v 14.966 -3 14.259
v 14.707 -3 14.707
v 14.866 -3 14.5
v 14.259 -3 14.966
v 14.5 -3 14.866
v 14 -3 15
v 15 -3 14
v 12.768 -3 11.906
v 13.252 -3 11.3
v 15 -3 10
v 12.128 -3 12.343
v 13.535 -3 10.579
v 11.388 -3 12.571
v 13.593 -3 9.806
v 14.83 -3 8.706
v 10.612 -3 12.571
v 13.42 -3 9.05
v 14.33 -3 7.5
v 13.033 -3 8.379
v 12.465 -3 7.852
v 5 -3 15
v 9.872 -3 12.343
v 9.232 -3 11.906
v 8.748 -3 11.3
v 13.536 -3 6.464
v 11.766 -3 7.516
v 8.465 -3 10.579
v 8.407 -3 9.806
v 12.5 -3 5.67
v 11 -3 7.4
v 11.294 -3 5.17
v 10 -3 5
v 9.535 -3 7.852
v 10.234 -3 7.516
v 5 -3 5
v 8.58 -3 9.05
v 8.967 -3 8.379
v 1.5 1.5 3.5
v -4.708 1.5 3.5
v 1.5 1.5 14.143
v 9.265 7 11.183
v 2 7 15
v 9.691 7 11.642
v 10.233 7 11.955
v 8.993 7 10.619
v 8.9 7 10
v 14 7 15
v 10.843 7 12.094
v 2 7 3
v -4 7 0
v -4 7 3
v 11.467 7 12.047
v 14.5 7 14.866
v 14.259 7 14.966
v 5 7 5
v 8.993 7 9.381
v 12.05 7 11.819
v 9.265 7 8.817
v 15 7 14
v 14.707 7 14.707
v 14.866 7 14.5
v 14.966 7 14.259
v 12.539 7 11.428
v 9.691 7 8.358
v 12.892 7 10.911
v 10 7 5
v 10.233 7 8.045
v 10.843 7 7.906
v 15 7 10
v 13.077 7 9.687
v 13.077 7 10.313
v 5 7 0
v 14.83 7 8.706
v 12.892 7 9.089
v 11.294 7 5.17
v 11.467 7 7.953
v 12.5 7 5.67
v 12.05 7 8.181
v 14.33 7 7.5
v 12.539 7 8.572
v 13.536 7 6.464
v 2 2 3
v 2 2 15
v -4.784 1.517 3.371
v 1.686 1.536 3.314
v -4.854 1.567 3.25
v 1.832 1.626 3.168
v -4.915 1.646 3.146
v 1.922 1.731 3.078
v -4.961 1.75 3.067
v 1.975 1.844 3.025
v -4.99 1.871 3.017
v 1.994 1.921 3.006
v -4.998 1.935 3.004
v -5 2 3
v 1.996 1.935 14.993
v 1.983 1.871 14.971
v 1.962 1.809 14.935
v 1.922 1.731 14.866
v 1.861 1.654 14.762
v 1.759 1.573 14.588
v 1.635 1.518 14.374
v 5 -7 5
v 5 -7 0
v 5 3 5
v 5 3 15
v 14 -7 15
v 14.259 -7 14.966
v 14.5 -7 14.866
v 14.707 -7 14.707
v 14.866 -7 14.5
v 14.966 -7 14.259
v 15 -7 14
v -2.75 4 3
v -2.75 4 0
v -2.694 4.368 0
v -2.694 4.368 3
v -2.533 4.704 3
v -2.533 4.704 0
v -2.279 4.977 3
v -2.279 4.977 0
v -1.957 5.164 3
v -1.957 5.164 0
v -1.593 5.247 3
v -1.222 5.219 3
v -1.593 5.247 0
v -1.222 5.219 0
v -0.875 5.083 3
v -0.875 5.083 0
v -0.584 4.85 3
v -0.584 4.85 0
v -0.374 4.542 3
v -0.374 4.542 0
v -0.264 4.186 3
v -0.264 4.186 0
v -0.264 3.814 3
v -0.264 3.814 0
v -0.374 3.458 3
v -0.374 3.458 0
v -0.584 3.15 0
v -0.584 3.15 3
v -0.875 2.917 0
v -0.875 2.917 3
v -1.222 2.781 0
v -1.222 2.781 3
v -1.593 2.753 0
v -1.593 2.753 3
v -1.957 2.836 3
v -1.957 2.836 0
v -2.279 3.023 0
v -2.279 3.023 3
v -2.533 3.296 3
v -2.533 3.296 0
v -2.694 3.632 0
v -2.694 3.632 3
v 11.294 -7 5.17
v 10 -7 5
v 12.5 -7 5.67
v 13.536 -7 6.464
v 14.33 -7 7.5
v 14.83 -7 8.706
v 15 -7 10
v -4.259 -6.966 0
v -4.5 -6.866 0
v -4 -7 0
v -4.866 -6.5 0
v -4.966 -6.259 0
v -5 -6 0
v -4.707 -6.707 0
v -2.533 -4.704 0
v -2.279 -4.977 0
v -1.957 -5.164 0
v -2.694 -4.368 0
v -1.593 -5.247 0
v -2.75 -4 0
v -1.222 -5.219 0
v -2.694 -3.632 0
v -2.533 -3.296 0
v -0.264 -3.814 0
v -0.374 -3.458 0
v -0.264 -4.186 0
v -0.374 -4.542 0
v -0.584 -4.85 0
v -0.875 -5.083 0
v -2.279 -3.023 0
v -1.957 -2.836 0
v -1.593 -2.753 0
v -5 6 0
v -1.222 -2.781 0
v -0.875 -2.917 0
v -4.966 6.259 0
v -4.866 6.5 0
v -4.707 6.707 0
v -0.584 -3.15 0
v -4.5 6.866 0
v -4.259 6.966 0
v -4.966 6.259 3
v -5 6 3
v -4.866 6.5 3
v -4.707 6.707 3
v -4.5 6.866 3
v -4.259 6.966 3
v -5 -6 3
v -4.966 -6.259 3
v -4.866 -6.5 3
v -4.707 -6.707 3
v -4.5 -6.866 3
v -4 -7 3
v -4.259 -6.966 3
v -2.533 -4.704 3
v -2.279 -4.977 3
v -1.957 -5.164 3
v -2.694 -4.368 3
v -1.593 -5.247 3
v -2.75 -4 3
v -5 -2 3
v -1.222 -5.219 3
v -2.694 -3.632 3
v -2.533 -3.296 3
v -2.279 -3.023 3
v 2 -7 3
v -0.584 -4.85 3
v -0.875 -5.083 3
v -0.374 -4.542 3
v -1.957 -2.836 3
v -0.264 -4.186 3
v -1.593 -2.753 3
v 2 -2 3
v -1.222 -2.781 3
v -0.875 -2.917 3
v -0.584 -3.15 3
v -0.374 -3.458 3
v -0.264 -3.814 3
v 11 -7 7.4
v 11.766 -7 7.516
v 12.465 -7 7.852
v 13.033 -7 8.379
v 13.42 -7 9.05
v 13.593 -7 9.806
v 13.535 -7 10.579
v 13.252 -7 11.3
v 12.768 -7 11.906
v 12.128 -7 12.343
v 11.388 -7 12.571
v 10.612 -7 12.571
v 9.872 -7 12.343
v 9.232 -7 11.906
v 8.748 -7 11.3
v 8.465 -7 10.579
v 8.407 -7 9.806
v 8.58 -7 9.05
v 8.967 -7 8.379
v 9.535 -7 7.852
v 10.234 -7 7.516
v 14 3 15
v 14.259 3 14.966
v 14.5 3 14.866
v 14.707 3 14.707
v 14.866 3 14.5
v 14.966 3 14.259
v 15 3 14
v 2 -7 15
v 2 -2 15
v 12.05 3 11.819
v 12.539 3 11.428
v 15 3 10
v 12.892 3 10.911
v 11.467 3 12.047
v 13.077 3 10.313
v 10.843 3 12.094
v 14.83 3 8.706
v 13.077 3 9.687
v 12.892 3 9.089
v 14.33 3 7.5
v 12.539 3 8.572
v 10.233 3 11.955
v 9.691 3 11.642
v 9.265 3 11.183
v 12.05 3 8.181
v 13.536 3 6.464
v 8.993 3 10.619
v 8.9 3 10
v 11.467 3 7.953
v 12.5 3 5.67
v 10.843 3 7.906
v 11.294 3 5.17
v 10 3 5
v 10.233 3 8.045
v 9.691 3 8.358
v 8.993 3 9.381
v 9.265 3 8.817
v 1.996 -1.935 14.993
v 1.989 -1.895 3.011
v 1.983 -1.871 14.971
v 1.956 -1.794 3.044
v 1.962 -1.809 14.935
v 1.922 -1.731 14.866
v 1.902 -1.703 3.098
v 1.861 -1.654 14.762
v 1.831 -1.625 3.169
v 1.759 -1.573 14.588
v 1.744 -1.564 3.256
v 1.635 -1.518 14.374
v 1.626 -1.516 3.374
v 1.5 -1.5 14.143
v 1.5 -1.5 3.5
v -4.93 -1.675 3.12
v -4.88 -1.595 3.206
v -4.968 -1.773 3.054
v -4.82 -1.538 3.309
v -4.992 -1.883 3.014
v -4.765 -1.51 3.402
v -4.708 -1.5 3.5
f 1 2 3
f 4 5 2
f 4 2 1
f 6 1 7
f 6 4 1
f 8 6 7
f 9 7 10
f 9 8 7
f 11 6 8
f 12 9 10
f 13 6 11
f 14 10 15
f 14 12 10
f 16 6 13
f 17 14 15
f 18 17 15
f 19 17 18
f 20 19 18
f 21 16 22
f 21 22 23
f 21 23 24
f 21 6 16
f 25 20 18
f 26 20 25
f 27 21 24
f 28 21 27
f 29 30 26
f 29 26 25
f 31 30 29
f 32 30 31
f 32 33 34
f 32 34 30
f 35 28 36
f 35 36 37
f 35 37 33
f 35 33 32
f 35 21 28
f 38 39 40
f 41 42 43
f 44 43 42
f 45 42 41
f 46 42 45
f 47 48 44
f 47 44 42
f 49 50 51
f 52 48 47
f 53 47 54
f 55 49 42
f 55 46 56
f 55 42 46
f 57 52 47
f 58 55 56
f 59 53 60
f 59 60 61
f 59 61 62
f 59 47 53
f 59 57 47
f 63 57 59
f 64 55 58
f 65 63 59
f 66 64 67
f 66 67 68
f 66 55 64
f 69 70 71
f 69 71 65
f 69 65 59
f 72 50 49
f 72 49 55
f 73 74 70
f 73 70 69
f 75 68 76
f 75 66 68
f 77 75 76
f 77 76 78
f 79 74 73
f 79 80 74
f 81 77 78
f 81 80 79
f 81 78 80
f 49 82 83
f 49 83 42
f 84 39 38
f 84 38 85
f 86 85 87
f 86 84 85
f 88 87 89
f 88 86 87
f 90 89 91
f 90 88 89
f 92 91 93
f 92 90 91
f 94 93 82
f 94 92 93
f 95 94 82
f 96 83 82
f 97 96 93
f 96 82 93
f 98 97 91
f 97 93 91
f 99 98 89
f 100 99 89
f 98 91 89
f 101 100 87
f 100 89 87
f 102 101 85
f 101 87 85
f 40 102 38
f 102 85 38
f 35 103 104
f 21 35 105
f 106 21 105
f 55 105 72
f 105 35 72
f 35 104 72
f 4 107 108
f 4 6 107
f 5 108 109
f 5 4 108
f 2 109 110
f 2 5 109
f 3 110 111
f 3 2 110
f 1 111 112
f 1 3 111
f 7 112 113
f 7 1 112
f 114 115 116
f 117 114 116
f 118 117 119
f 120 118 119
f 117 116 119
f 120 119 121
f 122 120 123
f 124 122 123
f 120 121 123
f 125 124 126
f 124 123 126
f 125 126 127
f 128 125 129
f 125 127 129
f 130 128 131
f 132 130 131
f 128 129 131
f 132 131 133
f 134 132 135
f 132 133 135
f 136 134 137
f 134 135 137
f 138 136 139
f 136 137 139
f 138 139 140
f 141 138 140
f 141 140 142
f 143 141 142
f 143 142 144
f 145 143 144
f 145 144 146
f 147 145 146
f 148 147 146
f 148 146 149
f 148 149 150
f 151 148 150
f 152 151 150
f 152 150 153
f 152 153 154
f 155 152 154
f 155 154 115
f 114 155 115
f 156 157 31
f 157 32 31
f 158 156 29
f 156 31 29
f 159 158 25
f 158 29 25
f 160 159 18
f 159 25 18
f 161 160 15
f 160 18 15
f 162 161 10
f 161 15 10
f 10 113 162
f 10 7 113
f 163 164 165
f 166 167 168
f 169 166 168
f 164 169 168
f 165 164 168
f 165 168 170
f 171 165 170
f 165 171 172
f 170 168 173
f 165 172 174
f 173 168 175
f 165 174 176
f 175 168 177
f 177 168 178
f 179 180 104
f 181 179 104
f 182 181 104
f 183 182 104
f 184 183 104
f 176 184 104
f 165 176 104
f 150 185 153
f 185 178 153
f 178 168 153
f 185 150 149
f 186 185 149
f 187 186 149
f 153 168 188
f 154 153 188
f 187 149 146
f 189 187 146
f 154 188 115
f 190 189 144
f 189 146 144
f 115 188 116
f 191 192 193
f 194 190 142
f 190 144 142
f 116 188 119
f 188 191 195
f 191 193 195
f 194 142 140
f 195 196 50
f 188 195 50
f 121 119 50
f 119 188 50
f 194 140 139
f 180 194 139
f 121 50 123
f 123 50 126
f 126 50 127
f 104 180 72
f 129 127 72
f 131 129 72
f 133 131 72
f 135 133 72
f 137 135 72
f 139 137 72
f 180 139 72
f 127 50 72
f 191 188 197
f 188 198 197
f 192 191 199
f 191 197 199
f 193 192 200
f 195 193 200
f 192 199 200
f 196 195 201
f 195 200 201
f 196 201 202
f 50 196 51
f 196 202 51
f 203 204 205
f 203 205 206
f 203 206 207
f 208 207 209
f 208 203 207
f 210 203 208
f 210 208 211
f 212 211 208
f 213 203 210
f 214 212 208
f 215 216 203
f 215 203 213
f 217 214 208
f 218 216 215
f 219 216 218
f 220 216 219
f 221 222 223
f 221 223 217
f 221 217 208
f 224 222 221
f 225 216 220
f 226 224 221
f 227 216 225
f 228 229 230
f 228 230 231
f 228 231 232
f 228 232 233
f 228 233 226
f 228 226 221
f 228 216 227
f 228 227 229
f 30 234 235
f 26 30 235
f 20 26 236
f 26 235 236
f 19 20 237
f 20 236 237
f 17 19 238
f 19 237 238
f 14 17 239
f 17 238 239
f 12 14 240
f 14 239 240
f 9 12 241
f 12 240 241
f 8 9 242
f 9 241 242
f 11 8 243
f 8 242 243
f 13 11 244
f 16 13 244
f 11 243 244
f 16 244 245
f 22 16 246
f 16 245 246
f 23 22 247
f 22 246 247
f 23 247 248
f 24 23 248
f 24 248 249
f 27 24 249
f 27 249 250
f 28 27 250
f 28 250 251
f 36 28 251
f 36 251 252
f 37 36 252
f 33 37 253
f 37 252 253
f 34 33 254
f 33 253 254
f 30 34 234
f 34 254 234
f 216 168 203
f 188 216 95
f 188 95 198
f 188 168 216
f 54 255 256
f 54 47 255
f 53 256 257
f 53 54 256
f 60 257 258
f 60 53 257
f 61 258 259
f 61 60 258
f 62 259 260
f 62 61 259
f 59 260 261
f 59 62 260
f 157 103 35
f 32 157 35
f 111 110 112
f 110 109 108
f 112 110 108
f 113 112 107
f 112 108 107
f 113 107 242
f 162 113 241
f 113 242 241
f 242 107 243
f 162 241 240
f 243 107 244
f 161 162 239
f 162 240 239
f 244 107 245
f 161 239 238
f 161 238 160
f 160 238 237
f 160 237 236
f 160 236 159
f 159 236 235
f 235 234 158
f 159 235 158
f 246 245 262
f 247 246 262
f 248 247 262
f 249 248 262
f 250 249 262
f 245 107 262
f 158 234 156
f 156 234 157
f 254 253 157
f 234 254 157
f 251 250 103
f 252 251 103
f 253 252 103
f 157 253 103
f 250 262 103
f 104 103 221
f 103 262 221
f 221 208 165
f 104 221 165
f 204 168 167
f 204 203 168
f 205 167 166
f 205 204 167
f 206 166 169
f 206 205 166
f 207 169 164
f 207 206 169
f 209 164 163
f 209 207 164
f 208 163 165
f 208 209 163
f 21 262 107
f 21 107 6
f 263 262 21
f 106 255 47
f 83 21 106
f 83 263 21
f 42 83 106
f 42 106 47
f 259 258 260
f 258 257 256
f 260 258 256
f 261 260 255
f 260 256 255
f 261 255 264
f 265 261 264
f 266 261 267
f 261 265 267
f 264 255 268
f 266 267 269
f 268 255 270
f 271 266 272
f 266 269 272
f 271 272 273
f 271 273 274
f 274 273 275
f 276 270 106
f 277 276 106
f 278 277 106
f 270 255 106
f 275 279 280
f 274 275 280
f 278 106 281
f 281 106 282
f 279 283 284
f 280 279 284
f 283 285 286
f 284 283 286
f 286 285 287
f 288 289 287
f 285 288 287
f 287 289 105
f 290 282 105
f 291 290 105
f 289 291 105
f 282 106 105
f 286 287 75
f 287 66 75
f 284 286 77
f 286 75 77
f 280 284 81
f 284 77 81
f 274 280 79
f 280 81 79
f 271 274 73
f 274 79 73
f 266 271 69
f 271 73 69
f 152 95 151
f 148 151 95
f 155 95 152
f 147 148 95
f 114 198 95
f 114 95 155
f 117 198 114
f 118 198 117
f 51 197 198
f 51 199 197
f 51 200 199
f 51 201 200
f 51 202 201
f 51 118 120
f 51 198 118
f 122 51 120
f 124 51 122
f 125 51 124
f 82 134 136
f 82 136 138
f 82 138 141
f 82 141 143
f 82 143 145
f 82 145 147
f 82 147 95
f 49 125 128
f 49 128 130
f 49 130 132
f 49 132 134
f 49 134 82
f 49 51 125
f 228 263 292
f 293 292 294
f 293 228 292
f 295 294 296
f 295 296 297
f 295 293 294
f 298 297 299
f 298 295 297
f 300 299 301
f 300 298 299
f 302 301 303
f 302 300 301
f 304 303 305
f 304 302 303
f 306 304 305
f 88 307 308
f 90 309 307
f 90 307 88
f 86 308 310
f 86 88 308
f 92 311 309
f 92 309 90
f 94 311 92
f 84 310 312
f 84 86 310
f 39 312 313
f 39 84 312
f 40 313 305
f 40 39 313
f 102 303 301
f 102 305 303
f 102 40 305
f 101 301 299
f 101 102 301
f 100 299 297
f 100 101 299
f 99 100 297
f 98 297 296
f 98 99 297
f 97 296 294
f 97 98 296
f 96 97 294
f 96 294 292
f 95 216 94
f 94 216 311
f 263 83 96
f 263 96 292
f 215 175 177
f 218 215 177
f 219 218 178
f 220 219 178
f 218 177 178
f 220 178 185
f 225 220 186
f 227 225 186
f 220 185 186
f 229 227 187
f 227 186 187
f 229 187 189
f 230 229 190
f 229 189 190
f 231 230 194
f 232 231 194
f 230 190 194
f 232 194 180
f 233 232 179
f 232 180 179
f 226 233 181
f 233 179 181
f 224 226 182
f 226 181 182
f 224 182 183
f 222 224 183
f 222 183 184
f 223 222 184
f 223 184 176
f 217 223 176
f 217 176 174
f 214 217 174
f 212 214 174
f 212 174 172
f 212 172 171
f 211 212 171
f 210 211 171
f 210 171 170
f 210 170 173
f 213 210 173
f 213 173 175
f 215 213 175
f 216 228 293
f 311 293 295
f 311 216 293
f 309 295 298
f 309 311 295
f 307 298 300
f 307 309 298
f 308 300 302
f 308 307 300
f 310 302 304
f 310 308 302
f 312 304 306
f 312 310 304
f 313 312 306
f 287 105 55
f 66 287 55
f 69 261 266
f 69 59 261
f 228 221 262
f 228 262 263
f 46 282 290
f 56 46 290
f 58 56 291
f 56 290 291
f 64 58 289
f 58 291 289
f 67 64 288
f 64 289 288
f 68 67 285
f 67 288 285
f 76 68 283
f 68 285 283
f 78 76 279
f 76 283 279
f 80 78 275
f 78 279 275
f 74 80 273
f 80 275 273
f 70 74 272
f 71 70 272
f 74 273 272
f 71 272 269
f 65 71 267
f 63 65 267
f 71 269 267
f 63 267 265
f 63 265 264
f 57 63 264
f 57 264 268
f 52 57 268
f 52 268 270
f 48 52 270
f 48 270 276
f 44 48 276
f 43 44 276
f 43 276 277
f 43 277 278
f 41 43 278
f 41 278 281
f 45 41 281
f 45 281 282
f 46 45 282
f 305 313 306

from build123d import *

# Parameters (mm, degrees)
SKETCH_1_W          = 10
SKETCH_1_H          = 14
EXTRUDE_1_DEPTH     = 3
SKETCH_2_W          = 3
SKETCH_2_H          = 14
EXTRUDE_2_DEPTH     = 12
RIB_1_REACH         = 19.292
SKETCH_3_WALL_W     = 50.475676922
SKETCH_3_WALL_H     = 3
HOLE_WIZARD_M3_2_D  = 2.5
SKETCH_7_W          = 10
SKETCH_7_H          = 4
EXTRUDE_3_DEPTH     = 10
FILLET_1_R          = 1
FILLET_2_R          = 0.5
FILLET_3_R          = 1
SKETCH_8_R          = 2.6
CUT_EXTRUDE_3_DEPTH = 4
HOLE_WIZARD_M5_1_D  = 4.2
FILLET_5_R          = 5


with BuildPart() as part:
    # 草图1 → 凸台-拉伸1 (new body)
    with BuildSketch(Plane.XY):
        Rectangle(SKETCH_1_W, SKETCH_1_H)
    extrude(amount=EXTRUDE_1_DEPTH)

    # 草图2 → 凸台-拉伸2 (add)
    with BuildSketch(Plane.XY.offset(3)):
        with Locations((3.5, 0)):
            Rectangle(SKETCH_2_W, SKETCH_2_H)
    extrude(amount=EXTRUDE_2_DEPTH)

    # 草图3 wall → 筋1 (add, up to next)
    with BuildSketch(Plane(origin=(-1.5, 0, 9), x_dir=(0.503871025524, 0, 0.863778900898), z_dir=(-0.863778900898, 0, 0.503871025524)), mode=Mode.PRIVATE) as rib_1_sk1:
        Rectangle(SKETCH_3_WALL_W, SKETCH_3_WALL_H)
    rib_1_tool1 = extrude(rib_1_sk1.sketch, amount=-RIB_1_REACH, mode=Mode.PRIVATE) - part.part
    add(rib_1_tool1.solids().sort_by_distance((-1.5, 0, 9))[0])

    # M3 螺纹孔2 (through all)
    with Locations(Plane(origin=(-1.5, 4, 3), x_dir=(1, 0, 0), z_dir=(0, 0, 1))):
        with Locations((0, 0), (0, -8)):
            Hole(HOLE_WIZARD_M3_2_D / 2)

    # 草图7 → 凸台-拉伸3 (add)
    with BuildSketch(Plane(origin=(5, 0, 0), x_dir=(0, 0, -1), z_dir=(1, 0, 0))):
        with Locations((-10, -5)):
            Rectangle(SKETCH_7_W, SKETCH_7_H)
        with Locations((-10, 5)):
            Rectangle(SKETCH_7_W, SKETCH_7_H)
    extrude(amount=EXTRUDE_3_DEPTH)

    # 圆角1
    fillet_1_edges = [part.edges().sort_by_distance(p)[0] for p in [
        (15, -5, 15),
        (15, 5, 15),
    ]]
    fillet(fillet_1_edges, radius=FILLET_1_R)

    # 圆角2
    fillet_2_edges = [part.edges().sort_by_distance(p)[0] for p in [
        (2, -1.5, 9),
        (-1.5, 1.5, 3),
        (-1.5, -1.5, 3),
        (2, 1.5, 9),
    ]]
    fillet(fillet_2_edges, radius=FILLET_2_R)

    # 圆角3
    fillet_3_edges = [part.edges().sort_by_distance(p)[0] for p in [
        (-5, -7, 1.5),
        (-5, 7, 1.5),
    ]]
    fillet(fillet_3_edges, radius=FILLET_3_R)

    # 草图8 → 切除-拉伸3 (cut)
    with BuildSketch(Plane.XZ.offset(7)):
        with Locations(Location((11, 10, 0), (0, 0, 270))):
            Circle(SKETCH_8_R)
    extrude(amount=-CUT_EXTRUDE_3_DEPTH, mode=Mode.SUBTRACT)

    # M5 螺纹孔1 (through all)
    with Locations(Plane(origin=(0, 7, 0), x_dir=(1, 0, 0), z_dir=(0, 1, 0))):
        with Locations((11, -10)):
            Hole(HOLE_WIZARD_M5_1_D / 2)

    # 圆角5
    fillet_5_edges = [part.edges().sort_by_distance(p)[0] for p in [
        (15, -5, 5),
        (15, 5, 5),
    ]]
    fillet(fillet_5_edges, radius=FILLET_5_R)


solid = part.part
